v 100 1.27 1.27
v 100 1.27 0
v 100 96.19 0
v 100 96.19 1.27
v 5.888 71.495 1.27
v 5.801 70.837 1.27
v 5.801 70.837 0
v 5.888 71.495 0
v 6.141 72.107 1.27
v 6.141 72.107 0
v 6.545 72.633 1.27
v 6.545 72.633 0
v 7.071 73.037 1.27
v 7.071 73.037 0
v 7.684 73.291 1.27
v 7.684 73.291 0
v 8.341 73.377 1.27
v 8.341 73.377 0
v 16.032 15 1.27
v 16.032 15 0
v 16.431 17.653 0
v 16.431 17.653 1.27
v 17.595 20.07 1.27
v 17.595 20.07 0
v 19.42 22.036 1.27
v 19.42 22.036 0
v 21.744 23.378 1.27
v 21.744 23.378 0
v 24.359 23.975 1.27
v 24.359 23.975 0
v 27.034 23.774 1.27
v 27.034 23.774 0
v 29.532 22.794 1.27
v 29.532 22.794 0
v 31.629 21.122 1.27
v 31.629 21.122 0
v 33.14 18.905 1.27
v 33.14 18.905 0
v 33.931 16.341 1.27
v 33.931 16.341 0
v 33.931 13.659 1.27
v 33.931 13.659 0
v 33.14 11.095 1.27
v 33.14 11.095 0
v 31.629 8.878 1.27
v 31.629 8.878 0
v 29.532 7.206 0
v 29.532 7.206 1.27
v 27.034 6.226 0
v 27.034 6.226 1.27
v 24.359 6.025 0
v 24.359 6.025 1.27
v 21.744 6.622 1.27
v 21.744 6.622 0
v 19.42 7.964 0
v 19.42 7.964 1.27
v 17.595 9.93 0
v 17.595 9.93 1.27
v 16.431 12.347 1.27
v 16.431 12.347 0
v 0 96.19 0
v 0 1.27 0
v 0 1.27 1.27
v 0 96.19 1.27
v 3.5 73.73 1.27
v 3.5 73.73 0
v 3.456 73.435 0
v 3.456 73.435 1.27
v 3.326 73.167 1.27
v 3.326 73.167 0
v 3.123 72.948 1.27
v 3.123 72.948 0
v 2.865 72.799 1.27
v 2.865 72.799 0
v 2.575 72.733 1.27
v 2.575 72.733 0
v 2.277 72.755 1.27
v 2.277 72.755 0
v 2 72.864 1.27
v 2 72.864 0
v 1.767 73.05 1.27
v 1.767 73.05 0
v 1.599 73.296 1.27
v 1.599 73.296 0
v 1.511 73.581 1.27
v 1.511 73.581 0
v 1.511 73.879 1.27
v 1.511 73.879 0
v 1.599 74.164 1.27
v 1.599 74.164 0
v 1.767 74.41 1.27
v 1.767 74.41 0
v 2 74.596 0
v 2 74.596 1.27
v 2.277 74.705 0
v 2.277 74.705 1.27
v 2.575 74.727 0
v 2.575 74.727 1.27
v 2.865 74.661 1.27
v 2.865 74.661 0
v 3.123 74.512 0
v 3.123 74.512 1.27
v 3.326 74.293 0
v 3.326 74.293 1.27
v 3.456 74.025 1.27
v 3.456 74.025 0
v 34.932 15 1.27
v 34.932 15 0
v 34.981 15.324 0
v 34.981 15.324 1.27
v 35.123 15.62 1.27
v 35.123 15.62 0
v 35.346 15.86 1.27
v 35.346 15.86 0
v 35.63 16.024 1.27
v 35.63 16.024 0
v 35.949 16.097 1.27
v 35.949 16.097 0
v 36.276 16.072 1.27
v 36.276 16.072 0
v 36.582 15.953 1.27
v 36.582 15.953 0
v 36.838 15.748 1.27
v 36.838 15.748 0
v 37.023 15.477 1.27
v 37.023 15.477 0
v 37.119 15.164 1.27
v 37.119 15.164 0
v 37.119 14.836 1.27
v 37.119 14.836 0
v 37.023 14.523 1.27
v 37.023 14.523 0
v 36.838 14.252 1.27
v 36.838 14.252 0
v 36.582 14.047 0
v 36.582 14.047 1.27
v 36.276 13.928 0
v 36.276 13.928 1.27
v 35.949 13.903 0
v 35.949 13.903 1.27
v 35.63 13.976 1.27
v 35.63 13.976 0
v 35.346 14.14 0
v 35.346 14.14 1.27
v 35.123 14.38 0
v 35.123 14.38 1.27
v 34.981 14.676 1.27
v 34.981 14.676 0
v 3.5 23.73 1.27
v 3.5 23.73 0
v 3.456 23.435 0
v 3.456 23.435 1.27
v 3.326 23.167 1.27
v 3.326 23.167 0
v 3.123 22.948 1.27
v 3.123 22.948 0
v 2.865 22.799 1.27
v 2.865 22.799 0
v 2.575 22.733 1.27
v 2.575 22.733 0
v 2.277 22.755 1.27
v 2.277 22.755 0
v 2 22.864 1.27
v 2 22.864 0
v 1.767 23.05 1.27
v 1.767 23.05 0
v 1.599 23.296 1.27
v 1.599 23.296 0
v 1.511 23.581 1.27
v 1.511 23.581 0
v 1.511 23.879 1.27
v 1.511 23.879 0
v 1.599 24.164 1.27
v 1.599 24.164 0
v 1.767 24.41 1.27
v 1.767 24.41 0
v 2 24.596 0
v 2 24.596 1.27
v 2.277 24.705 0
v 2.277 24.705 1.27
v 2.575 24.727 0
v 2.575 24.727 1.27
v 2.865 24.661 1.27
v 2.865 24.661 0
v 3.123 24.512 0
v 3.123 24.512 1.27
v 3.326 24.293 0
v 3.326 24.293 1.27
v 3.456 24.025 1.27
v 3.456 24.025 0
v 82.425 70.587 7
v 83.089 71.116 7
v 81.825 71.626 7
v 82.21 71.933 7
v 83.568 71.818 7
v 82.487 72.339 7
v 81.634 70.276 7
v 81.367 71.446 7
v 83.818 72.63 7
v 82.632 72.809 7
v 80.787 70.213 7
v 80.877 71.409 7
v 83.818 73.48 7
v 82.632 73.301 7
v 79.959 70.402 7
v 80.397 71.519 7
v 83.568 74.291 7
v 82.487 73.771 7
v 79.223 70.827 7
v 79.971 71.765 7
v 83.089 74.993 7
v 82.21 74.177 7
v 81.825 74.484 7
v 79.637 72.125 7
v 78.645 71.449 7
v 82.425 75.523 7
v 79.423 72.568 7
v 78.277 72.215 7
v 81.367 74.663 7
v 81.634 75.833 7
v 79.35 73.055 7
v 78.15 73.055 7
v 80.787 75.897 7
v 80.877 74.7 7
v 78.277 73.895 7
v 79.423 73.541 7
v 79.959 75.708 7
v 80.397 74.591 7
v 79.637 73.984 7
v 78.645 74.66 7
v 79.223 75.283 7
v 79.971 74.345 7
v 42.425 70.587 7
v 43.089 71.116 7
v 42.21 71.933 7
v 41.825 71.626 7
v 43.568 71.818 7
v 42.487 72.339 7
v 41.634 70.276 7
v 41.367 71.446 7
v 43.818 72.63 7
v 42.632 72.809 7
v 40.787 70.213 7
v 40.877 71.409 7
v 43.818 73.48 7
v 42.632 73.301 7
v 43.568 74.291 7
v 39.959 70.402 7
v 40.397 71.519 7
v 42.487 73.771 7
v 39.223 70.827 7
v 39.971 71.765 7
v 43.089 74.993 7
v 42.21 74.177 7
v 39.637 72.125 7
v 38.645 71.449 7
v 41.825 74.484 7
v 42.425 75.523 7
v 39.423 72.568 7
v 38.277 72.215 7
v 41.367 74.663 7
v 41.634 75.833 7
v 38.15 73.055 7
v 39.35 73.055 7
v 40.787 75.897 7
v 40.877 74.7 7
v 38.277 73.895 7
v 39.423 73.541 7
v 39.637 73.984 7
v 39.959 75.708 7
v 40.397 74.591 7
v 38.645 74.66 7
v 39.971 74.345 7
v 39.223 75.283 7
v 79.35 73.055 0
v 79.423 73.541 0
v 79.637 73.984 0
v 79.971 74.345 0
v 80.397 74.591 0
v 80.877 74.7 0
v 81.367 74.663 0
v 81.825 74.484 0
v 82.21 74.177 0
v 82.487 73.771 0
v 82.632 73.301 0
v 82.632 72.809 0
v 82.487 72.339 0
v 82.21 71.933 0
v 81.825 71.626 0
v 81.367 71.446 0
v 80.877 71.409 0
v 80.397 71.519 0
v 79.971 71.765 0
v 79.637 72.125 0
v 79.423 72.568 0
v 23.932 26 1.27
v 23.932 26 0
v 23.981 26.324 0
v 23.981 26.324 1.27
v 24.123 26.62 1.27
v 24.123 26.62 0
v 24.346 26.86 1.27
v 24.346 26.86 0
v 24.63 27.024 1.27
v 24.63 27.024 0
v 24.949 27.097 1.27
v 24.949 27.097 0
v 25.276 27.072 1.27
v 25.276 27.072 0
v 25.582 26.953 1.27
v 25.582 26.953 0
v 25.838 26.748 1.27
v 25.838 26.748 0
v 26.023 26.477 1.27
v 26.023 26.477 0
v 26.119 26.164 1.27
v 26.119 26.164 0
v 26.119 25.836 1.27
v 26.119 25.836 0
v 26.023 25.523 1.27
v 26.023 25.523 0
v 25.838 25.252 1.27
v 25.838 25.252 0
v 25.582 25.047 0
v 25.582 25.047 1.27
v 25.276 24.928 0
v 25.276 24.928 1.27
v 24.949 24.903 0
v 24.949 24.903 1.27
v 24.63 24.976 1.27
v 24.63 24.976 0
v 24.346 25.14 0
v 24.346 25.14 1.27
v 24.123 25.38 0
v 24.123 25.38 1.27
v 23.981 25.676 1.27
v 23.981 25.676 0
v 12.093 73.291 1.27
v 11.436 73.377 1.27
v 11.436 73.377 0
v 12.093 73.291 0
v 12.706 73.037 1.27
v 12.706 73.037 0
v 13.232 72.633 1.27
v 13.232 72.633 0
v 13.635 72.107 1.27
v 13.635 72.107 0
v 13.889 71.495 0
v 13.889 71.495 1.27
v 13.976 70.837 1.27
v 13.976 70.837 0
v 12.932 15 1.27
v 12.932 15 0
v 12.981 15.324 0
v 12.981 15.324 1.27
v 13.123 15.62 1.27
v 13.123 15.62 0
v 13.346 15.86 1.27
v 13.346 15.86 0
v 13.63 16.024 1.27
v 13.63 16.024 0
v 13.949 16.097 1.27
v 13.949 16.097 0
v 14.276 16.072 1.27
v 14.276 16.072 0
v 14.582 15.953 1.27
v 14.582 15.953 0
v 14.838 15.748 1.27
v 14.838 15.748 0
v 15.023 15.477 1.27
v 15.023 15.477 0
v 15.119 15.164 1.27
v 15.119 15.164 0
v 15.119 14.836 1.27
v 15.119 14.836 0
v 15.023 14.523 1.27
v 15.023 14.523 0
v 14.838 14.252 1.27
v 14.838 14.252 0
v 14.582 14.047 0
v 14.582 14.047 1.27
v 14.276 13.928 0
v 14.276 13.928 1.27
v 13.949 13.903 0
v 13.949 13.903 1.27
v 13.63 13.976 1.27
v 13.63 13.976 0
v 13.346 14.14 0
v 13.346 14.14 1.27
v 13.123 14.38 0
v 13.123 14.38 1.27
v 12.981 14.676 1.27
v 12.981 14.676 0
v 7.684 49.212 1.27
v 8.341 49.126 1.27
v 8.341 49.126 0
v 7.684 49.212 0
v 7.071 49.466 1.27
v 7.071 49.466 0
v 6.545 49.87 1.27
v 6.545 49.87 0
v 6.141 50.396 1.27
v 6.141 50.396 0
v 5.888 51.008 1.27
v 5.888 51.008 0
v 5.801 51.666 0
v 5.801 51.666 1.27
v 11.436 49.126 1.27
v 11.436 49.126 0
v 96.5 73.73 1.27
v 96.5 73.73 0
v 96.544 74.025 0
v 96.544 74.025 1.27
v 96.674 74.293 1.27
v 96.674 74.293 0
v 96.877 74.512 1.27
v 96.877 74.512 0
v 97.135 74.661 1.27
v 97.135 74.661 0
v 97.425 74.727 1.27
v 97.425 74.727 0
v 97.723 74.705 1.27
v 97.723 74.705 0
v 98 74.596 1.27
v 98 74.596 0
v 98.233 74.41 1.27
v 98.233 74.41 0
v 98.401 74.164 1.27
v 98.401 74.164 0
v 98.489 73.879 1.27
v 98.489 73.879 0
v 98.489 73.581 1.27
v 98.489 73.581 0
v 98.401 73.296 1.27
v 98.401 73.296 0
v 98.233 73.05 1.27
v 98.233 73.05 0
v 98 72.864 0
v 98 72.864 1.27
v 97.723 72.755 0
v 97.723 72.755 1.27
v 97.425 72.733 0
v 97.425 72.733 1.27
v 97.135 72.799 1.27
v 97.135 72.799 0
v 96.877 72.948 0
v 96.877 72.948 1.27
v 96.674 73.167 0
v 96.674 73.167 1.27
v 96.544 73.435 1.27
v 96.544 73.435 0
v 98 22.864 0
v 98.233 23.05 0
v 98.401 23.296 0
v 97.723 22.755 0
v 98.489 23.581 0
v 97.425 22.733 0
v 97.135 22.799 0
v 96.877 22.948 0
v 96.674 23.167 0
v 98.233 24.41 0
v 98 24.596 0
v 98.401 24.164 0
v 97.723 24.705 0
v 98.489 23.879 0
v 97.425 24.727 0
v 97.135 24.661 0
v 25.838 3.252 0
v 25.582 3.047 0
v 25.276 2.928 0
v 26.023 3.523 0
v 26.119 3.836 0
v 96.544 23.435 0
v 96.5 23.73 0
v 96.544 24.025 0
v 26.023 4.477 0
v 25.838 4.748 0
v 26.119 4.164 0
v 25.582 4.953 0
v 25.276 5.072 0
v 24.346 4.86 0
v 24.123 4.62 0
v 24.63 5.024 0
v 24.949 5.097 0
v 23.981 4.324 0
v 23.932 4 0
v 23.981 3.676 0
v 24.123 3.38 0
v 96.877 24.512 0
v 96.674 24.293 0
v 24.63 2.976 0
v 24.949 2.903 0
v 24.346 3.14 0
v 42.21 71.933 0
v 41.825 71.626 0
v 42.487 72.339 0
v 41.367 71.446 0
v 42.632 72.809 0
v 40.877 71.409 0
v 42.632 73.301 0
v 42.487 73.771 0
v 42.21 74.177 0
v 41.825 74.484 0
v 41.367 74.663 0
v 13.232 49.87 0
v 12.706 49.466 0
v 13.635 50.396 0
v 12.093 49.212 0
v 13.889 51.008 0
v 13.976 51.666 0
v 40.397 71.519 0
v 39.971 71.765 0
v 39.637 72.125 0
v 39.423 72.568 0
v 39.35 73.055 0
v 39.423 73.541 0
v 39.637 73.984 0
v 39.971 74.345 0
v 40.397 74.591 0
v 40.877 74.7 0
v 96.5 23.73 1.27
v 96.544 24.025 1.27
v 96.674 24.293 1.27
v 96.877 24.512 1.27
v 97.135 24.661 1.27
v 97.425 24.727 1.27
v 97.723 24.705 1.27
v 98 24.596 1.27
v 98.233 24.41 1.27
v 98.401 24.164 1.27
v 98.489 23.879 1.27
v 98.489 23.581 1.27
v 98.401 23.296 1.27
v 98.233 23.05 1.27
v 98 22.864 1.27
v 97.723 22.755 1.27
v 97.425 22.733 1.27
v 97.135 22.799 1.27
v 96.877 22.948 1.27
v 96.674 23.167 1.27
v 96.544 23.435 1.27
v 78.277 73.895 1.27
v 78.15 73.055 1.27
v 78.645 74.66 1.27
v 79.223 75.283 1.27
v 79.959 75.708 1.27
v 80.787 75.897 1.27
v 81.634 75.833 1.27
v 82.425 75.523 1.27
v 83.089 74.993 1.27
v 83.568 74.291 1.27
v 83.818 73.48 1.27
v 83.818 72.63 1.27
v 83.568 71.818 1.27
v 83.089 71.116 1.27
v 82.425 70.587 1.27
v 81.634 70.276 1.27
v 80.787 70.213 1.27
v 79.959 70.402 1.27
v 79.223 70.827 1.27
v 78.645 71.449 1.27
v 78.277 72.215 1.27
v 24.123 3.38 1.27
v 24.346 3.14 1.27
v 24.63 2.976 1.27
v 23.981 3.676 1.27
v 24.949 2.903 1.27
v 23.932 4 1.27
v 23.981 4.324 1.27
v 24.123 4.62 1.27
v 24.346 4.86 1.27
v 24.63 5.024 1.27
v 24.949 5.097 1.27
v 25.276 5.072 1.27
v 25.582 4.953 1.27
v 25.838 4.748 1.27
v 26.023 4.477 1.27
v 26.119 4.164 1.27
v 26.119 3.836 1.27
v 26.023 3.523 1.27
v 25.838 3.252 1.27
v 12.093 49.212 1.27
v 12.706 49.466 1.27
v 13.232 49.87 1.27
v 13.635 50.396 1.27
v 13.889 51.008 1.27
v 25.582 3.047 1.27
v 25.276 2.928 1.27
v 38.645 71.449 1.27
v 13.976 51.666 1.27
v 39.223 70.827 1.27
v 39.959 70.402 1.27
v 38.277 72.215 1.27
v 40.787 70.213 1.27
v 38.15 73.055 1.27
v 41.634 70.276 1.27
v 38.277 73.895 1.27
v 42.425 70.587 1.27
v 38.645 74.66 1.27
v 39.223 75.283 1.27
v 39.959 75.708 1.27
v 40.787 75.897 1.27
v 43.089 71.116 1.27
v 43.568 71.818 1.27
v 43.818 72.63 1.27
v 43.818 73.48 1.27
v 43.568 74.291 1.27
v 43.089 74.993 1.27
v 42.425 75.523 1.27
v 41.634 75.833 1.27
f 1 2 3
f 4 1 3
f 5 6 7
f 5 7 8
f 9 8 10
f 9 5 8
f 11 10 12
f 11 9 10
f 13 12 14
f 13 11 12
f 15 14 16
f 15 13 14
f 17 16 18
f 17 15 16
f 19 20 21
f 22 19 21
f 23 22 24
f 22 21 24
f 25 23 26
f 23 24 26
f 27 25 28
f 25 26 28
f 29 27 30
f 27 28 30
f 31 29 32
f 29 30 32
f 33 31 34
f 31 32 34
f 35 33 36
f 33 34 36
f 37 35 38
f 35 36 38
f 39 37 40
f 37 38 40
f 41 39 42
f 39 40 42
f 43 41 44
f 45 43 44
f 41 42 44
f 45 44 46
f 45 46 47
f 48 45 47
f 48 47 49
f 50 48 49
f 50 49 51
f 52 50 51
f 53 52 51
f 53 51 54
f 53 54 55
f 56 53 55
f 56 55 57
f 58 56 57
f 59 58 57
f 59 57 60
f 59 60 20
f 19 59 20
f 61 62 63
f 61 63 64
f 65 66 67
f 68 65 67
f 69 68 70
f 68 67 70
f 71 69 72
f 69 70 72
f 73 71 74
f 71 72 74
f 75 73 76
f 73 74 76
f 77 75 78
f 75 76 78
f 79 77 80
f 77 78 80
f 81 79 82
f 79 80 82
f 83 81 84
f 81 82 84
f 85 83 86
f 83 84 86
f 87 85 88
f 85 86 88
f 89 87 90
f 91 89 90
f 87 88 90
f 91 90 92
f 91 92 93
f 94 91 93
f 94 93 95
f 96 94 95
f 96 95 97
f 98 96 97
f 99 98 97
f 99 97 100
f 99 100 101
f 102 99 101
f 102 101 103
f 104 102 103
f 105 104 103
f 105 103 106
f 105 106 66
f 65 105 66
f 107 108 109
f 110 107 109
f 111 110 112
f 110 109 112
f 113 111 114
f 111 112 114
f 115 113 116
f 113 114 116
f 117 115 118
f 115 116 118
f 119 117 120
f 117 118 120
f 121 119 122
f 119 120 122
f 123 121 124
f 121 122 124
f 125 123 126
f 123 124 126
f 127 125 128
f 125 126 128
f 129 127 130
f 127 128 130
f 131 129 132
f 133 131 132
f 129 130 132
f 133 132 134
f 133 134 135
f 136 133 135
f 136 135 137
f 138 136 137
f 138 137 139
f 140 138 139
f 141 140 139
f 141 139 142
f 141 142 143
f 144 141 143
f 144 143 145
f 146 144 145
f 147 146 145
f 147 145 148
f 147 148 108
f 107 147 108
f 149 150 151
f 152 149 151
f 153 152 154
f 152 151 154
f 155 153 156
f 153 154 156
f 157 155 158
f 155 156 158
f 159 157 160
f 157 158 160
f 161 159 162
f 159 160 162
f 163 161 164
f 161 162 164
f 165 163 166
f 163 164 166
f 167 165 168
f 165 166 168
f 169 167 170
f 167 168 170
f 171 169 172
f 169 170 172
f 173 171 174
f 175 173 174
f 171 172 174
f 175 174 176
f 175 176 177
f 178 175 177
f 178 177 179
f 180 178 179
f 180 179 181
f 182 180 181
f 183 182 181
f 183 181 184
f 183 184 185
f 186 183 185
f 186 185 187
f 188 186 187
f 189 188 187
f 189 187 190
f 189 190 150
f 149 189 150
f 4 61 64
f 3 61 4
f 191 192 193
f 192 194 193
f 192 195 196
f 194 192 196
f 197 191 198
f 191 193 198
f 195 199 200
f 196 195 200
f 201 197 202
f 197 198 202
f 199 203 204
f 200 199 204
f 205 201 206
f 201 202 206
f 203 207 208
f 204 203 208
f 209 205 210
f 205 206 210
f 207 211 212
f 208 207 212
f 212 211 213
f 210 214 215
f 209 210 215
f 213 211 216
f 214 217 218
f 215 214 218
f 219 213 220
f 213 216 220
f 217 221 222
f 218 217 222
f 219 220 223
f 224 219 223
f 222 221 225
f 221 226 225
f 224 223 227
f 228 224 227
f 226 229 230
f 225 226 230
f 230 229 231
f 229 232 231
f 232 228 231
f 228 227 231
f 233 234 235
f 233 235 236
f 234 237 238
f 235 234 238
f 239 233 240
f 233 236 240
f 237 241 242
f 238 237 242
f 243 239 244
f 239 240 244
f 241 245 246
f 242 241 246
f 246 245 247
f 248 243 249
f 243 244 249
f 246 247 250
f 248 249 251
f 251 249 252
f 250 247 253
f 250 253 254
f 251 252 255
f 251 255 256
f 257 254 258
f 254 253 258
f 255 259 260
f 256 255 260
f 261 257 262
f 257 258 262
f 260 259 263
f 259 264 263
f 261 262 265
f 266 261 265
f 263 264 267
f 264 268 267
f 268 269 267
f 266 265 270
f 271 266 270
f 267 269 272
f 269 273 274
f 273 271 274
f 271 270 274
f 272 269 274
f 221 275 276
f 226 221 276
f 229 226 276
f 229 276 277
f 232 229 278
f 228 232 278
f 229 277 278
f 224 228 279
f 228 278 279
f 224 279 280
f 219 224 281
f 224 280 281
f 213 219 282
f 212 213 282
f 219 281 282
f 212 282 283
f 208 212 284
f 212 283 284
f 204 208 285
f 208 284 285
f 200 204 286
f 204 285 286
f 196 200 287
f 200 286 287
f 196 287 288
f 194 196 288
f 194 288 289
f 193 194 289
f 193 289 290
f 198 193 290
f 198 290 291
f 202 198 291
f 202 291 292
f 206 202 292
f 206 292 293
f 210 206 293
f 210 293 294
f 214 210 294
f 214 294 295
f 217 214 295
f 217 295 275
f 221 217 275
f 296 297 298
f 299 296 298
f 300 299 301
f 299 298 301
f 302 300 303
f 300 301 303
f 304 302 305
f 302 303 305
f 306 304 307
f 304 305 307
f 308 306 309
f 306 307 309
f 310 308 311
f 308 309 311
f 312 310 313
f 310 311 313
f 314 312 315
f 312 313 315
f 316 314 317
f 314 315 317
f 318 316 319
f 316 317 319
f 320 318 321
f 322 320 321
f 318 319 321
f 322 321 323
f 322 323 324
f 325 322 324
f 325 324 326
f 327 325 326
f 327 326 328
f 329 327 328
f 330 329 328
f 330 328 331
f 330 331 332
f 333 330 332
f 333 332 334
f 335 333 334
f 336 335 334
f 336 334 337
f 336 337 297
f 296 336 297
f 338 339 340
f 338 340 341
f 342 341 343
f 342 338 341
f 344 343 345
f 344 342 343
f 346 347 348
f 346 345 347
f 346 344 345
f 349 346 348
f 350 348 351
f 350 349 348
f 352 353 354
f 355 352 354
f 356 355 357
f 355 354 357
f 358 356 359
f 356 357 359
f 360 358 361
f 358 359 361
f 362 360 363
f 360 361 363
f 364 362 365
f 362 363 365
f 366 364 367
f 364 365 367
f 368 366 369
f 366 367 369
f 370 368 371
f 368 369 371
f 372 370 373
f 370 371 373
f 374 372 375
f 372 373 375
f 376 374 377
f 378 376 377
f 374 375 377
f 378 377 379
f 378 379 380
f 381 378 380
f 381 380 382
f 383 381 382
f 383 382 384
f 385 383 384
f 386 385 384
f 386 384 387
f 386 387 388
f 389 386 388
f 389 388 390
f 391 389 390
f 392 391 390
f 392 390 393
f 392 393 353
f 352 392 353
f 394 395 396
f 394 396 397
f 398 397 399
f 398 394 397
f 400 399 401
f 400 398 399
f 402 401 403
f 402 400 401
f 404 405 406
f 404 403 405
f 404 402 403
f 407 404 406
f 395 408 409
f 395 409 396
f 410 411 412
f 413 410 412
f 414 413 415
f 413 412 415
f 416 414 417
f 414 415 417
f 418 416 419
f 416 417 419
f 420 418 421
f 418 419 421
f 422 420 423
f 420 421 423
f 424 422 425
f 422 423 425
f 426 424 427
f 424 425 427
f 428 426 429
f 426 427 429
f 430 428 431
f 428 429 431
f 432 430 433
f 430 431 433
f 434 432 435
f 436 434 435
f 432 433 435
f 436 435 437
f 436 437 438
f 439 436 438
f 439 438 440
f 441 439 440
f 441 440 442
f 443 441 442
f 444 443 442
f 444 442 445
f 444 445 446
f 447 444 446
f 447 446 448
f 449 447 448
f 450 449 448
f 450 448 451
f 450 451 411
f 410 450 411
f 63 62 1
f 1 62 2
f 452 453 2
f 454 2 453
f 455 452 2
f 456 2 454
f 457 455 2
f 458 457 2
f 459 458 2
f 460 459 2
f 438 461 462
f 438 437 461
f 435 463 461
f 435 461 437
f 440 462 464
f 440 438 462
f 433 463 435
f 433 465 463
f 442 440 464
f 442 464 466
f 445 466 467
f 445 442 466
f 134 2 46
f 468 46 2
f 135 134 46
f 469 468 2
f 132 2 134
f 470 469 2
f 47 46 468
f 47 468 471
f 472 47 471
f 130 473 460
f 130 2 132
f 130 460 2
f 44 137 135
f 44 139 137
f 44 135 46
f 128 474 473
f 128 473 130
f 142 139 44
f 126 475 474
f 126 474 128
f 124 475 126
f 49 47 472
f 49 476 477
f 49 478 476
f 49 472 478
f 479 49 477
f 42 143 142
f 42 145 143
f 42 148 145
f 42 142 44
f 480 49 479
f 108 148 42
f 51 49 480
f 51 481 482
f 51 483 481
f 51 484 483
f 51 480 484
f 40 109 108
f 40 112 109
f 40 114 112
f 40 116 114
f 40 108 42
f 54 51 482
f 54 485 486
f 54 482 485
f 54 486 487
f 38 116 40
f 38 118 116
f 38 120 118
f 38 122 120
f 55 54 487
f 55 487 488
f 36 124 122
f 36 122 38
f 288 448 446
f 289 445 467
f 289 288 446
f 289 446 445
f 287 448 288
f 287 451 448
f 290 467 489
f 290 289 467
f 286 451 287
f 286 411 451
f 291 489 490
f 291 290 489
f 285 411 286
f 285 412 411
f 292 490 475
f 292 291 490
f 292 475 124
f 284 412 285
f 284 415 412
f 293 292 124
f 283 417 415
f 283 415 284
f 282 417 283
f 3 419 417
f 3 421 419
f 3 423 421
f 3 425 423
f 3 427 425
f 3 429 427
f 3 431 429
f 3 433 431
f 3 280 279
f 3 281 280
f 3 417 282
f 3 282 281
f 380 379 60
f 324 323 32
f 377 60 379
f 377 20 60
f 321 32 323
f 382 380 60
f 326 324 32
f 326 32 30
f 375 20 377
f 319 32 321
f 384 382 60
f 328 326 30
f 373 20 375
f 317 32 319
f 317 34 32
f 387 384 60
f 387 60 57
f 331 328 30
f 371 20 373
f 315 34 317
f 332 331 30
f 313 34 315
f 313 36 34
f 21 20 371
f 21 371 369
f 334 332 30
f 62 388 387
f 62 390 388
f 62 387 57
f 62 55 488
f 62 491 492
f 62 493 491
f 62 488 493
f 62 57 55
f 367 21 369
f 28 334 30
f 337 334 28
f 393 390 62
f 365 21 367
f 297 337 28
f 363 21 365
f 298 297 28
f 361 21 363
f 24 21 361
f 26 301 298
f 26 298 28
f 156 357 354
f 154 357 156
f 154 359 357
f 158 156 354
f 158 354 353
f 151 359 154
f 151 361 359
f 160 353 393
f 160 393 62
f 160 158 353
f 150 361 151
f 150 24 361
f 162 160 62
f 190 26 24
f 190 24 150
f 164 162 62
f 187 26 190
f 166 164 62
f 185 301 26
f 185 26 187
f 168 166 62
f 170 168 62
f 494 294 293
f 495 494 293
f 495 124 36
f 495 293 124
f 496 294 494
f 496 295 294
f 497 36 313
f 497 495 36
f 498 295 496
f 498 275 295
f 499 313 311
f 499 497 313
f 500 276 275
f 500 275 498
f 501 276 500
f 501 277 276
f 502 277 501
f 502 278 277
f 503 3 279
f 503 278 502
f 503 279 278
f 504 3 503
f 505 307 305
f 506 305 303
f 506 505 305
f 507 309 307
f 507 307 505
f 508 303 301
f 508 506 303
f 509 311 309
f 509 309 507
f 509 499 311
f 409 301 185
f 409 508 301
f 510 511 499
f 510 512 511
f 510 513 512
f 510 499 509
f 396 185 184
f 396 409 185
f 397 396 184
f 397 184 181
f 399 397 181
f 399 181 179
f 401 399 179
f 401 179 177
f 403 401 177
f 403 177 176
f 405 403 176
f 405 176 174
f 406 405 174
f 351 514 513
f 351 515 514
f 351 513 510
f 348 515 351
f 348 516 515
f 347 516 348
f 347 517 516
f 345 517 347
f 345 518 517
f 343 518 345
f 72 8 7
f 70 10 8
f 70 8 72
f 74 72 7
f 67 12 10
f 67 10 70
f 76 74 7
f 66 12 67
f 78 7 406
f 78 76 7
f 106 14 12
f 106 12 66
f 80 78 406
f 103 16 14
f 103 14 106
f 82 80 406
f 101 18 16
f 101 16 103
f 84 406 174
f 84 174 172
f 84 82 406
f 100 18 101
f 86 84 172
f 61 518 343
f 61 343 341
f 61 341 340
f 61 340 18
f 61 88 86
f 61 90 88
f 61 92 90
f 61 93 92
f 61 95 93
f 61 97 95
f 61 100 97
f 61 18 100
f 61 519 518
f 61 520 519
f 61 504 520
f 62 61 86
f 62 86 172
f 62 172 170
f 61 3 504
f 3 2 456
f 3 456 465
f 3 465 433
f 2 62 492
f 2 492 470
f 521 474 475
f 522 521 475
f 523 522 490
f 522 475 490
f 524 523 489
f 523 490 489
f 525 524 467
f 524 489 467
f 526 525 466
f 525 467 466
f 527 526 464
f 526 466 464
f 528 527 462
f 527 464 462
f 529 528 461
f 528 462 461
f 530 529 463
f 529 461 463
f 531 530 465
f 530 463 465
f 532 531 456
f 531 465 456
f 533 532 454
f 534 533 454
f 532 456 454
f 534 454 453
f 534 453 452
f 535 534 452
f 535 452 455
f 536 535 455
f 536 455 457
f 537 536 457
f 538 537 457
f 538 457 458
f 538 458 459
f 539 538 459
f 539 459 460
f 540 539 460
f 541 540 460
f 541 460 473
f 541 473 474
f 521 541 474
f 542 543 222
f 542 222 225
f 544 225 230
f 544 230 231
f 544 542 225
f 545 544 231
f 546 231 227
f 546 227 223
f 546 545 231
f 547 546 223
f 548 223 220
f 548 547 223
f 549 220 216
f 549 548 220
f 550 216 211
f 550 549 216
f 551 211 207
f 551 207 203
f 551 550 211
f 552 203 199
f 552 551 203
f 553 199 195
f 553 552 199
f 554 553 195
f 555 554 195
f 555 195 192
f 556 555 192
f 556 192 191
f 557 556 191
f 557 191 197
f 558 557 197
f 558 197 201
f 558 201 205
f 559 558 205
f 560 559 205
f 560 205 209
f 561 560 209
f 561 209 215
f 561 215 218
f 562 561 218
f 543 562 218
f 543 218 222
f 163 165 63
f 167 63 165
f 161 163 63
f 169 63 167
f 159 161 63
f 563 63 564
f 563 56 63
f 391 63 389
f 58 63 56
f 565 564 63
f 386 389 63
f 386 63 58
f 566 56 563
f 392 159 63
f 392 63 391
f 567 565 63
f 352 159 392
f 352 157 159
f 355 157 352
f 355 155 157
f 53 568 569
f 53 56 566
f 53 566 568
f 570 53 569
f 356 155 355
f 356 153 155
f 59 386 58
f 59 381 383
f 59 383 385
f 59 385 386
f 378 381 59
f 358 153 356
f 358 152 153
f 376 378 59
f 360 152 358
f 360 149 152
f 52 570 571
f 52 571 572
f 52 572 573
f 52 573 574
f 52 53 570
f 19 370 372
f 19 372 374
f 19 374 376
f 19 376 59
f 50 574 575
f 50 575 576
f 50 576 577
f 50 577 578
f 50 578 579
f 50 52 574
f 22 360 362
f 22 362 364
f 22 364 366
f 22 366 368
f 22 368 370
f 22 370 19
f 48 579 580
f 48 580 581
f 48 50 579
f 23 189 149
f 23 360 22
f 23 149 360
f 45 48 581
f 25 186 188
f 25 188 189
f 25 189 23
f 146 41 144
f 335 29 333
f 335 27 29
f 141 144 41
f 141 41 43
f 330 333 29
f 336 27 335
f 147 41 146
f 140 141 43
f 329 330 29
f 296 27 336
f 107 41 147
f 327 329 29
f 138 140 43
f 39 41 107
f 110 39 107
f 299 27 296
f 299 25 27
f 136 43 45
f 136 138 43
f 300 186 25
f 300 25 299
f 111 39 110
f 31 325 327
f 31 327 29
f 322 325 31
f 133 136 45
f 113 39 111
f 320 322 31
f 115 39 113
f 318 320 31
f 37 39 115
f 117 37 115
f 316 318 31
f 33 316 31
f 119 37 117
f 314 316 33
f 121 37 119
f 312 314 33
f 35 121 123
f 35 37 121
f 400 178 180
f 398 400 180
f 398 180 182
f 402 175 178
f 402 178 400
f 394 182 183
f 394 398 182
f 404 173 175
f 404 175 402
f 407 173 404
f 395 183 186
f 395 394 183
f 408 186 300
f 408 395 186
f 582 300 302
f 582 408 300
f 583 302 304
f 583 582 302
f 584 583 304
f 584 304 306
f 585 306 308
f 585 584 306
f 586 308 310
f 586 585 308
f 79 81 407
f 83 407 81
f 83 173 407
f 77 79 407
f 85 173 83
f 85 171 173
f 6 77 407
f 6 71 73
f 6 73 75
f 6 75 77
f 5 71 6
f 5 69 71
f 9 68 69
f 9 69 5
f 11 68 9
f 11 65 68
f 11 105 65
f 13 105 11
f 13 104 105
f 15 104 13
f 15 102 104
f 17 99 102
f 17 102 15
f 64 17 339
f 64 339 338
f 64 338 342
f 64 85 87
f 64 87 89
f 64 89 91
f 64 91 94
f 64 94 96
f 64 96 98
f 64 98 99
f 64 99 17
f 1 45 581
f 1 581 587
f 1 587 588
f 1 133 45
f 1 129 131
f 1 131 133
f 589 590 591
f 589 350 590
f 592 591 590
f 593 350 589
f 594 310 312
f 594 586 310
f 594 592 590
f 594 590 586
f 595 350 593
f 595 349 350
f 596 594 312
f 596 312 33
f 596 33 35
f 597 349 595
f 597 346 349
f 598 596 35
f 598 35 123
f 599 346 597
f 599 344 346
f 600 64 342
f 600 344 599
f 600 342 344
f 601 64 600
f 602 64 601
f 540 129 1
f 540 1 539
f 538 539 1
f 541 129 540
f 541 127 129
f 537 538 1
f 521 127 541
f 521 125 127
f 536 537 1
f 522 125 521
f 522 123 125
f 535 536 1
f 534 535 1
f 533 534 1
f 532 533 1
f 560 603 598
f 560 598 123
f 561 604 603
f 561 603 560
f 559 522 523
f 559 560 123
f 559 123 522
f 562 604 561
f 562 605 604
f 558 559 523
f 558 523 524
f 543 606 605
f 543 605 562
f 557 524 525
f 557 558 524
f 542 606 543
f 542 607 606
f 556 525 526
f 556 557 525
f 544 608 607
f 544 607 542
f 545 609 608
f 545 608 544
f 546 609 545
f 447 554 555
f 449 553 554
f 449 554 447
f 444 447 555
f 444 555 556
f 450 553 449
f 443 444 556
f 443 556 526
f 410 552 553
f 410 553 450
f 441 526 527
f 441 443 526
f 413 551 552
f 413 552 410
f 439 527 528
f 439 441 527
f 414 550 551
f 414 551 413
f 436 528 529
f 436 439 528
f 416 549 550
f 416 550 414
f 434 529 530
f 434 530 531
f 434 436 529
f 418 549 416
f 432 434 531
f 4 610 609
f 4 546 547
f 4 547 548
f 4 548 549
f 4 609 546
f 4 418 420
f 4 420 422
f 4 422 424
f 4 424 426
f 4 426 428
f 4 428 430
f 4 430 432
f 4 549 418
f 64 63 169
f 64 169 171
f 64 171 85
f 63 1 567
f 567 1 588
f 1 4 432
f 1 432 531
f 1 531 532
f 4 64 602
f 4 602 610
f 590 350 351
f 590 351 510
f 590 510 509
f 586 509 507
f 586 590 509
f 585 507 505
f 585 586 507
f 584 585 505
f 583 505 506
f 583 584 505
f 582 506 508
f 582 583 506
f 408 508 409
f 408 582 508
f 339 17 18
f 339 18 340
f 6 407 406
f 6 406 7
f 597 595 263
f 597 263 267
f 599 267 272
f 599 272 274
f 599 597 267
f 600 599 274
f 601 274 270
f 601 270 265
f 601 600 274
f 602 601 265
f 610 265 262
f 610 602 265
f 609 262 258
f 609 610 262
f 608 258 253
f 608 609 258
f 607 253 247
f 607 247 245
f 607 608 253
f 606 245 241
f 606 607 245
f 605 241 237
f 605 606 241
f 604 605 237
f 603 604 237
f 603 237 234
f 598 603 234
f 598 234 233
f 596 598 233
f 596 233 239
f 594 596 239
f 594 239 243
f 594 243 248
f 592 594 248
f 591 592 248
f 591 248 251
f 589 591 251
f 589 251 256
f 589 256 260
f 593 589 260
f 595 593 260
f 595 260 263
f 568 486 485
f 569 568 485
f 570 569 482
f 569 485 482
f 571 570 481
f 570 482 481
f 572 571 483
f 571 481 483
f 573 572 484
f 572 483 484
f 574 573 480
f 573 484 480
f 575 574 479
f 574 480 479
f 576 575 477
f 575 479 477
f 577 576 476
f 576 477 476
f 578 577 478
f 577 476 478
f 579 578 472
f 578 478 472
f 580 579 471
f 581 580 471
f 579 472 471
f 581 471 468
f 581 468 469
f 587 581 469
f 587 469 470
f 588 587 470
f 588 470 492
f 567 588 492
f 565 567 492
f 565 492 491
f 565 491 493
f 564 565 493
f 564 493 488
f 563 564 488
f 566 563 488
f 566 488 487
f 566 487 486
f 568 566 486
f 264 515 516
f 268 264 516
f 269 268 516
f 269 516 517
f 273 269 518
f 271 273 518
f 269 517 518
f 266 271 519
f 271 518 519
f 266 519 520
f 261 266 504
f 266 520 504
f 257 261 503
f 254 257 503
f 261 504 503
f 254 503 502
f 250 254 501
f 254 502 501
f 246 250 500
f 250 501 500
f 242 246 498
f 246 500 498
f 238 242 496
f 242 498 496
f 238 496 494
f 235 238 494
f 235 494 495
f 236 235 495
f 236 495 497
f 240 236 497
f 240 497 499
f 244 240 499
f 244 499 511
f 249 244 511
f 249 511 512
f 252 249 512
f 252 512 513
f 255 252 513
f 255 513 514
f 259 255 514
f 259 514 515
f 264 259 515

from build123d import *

# Parameters (mm, degrees)
SKETCH1_W             = 100
SKETCH1_H             = 94.92
BOSS_EXTRUDE1_DEPTH   = 1.27
SKETCH8_R             = 2.85
SKETCH8_R_2           = 2
BOSS_EXTRUDE3_DEPTH   = 7
M4X0_7_TAPPED_HOLE1_D = 3.3
SKETCH13_R            = 9
SKETCH13_R_2          = 1.1
CUT_EXTRUDE7_DEPTH    = 5
SKETCH14_R            = 1
CUT_EXTRUDE8_DEPTH    = 10
CUT_EXTRUDE9_DEPTH    = 2.54


with BuildPart() as part:
    # Sketch1 → Boss-Extrude1 (new body)
    with BuildSketch(Plane.XY):
        with Locations((50, 48.73)):
            Rectangle(SKETCH1_W, SKETCH1_H)
    extrude(amount=BOSS_EXTRUDE1_DEPTH)

    # Sketch8 → Boss-Extrude3 (add)
    with BuildSketch(Plane(origin=(0, 0, 0), x_dir=(-1, 0, 0), z_dir=(0, 0, -1))):
        with Locations((-81.00001, 73.05481987)):
            Circle(SKETCH8_R)
        with Locations((-81.00001, 73.05481987)):
            Circle(SKETCH8_R_2, mode=Mode.SUBTRACT)
        with Locations((-81.00001, 73.05481987)):
            Circle(SKETCH8_R_2)
        with Locations((-41.00001, 73.05481987)):
            Circle(SKETCH8_R)
        with Locations((-41.00001, 73.05481987)):
            Circle(SKETCH8_R_2, mode=Mode.SUBTRACT)
        with Locations((-41.00001, 73.05481987)):
            Circle(SKETCH8_R_2)
    extrude(amount=-BOSS_EXTRUDE3_DEPTH)

    # M4x0.7 Tapped Hole1 (through all)
    with Locations(Plane.XY.offset(7)):
        with Locations((81.00001, 73.05481987), (41.00001, 73.05481987)):
            Hole(M4X0_7_TAPPED_HOLE1_D / 2)

    # Sketch13 → Cut-Extrude7 (cut)
    with BuildSketch(Plane(origin=(0, 0, 0), x_dir=(-1, 0, 0), z_dir=(0, 0, -1))):
        with Locations((-25.031645402, 15)):
            Circle(SKETCH13_R)
        with Locations((-14.031645402, 15)):
            Circle(SKETCH13_R_2)
        with Locations((-25.031645402, 4)):
            Circle(SKETCH13_R_2)
        with Locations((-36.031645402, 15)):
            Circle(SKETCH13_R_2)
        with Locations((-25.031645402, 26)):
            Circle(SKETCH13_R_2)
    extrude(amount=-CUT_EXTRUDE7_DEPTH, mode=Mode.SUBTRACT)

    # Sketch14 → Cut-Extrude8 (cut)
    with BuildSketch(Plane(origin=(0, 0, 0), x_dir=(-1, 0, 0), z_dir=(0, 0, -1))):
        with Locations(Location((-2.5, 73.73, 0), (0, 0, 180))):
            Circle(SKETCH14_R)
        with Locations(Location((-2.5, 23.73, 0), (0, 0, 180))):
            Circle(SKETCH14_R)
        with Locations((-97.5, 23.73)):
            Circle(SKETCH14_R)
        with Locations((-97.5, 73.73)):
            Circle(SKETCH14_R)
    extrude(amount=-CUT_EXTRUDE8_DEPTH, mode=Mode.SUBTRACT)

    # Sketch15 → Cut-Extrude9 (cut)
    with BuildSketch(Plane.XY.offset(1.27)):
        with BuildLine():
            Line((5.801106051, 51.665736829), (5.801106051, 70.837304612))
            ThreePointArc((5.801106051, 70.837304612), (6.545054826, 72.633355836), (8.341106051, 73.377304612))
            Line((8.341106051, 73.377304612), (11.435588088, 73.377304612))
            ThreePointArc((11.435588088, 73.377304612), (13.231639313, 72.633355836), (13.975588088, 70.837304612))
            Line((13.975588088, 70.837304612), (13.975588088, 51.665736829))
            ThreePointArc((13.975588088, 51.665736829), (13.231639313, 49.869685605), (11.435588088, 49.125736829))
            Line((11.435588088, 49.125736829), (8.341106051, 49.125736829))
            ThreePointArc((8.341106051, 49.125736829), (6.545054826, 49.869685605), (5.801106051, 51.665736829))
        make_face()
    extrude(amount=-CUT_EXTRUDE9_DEPTH, mode=Mode.SUBTRACT)


solid = part.part
